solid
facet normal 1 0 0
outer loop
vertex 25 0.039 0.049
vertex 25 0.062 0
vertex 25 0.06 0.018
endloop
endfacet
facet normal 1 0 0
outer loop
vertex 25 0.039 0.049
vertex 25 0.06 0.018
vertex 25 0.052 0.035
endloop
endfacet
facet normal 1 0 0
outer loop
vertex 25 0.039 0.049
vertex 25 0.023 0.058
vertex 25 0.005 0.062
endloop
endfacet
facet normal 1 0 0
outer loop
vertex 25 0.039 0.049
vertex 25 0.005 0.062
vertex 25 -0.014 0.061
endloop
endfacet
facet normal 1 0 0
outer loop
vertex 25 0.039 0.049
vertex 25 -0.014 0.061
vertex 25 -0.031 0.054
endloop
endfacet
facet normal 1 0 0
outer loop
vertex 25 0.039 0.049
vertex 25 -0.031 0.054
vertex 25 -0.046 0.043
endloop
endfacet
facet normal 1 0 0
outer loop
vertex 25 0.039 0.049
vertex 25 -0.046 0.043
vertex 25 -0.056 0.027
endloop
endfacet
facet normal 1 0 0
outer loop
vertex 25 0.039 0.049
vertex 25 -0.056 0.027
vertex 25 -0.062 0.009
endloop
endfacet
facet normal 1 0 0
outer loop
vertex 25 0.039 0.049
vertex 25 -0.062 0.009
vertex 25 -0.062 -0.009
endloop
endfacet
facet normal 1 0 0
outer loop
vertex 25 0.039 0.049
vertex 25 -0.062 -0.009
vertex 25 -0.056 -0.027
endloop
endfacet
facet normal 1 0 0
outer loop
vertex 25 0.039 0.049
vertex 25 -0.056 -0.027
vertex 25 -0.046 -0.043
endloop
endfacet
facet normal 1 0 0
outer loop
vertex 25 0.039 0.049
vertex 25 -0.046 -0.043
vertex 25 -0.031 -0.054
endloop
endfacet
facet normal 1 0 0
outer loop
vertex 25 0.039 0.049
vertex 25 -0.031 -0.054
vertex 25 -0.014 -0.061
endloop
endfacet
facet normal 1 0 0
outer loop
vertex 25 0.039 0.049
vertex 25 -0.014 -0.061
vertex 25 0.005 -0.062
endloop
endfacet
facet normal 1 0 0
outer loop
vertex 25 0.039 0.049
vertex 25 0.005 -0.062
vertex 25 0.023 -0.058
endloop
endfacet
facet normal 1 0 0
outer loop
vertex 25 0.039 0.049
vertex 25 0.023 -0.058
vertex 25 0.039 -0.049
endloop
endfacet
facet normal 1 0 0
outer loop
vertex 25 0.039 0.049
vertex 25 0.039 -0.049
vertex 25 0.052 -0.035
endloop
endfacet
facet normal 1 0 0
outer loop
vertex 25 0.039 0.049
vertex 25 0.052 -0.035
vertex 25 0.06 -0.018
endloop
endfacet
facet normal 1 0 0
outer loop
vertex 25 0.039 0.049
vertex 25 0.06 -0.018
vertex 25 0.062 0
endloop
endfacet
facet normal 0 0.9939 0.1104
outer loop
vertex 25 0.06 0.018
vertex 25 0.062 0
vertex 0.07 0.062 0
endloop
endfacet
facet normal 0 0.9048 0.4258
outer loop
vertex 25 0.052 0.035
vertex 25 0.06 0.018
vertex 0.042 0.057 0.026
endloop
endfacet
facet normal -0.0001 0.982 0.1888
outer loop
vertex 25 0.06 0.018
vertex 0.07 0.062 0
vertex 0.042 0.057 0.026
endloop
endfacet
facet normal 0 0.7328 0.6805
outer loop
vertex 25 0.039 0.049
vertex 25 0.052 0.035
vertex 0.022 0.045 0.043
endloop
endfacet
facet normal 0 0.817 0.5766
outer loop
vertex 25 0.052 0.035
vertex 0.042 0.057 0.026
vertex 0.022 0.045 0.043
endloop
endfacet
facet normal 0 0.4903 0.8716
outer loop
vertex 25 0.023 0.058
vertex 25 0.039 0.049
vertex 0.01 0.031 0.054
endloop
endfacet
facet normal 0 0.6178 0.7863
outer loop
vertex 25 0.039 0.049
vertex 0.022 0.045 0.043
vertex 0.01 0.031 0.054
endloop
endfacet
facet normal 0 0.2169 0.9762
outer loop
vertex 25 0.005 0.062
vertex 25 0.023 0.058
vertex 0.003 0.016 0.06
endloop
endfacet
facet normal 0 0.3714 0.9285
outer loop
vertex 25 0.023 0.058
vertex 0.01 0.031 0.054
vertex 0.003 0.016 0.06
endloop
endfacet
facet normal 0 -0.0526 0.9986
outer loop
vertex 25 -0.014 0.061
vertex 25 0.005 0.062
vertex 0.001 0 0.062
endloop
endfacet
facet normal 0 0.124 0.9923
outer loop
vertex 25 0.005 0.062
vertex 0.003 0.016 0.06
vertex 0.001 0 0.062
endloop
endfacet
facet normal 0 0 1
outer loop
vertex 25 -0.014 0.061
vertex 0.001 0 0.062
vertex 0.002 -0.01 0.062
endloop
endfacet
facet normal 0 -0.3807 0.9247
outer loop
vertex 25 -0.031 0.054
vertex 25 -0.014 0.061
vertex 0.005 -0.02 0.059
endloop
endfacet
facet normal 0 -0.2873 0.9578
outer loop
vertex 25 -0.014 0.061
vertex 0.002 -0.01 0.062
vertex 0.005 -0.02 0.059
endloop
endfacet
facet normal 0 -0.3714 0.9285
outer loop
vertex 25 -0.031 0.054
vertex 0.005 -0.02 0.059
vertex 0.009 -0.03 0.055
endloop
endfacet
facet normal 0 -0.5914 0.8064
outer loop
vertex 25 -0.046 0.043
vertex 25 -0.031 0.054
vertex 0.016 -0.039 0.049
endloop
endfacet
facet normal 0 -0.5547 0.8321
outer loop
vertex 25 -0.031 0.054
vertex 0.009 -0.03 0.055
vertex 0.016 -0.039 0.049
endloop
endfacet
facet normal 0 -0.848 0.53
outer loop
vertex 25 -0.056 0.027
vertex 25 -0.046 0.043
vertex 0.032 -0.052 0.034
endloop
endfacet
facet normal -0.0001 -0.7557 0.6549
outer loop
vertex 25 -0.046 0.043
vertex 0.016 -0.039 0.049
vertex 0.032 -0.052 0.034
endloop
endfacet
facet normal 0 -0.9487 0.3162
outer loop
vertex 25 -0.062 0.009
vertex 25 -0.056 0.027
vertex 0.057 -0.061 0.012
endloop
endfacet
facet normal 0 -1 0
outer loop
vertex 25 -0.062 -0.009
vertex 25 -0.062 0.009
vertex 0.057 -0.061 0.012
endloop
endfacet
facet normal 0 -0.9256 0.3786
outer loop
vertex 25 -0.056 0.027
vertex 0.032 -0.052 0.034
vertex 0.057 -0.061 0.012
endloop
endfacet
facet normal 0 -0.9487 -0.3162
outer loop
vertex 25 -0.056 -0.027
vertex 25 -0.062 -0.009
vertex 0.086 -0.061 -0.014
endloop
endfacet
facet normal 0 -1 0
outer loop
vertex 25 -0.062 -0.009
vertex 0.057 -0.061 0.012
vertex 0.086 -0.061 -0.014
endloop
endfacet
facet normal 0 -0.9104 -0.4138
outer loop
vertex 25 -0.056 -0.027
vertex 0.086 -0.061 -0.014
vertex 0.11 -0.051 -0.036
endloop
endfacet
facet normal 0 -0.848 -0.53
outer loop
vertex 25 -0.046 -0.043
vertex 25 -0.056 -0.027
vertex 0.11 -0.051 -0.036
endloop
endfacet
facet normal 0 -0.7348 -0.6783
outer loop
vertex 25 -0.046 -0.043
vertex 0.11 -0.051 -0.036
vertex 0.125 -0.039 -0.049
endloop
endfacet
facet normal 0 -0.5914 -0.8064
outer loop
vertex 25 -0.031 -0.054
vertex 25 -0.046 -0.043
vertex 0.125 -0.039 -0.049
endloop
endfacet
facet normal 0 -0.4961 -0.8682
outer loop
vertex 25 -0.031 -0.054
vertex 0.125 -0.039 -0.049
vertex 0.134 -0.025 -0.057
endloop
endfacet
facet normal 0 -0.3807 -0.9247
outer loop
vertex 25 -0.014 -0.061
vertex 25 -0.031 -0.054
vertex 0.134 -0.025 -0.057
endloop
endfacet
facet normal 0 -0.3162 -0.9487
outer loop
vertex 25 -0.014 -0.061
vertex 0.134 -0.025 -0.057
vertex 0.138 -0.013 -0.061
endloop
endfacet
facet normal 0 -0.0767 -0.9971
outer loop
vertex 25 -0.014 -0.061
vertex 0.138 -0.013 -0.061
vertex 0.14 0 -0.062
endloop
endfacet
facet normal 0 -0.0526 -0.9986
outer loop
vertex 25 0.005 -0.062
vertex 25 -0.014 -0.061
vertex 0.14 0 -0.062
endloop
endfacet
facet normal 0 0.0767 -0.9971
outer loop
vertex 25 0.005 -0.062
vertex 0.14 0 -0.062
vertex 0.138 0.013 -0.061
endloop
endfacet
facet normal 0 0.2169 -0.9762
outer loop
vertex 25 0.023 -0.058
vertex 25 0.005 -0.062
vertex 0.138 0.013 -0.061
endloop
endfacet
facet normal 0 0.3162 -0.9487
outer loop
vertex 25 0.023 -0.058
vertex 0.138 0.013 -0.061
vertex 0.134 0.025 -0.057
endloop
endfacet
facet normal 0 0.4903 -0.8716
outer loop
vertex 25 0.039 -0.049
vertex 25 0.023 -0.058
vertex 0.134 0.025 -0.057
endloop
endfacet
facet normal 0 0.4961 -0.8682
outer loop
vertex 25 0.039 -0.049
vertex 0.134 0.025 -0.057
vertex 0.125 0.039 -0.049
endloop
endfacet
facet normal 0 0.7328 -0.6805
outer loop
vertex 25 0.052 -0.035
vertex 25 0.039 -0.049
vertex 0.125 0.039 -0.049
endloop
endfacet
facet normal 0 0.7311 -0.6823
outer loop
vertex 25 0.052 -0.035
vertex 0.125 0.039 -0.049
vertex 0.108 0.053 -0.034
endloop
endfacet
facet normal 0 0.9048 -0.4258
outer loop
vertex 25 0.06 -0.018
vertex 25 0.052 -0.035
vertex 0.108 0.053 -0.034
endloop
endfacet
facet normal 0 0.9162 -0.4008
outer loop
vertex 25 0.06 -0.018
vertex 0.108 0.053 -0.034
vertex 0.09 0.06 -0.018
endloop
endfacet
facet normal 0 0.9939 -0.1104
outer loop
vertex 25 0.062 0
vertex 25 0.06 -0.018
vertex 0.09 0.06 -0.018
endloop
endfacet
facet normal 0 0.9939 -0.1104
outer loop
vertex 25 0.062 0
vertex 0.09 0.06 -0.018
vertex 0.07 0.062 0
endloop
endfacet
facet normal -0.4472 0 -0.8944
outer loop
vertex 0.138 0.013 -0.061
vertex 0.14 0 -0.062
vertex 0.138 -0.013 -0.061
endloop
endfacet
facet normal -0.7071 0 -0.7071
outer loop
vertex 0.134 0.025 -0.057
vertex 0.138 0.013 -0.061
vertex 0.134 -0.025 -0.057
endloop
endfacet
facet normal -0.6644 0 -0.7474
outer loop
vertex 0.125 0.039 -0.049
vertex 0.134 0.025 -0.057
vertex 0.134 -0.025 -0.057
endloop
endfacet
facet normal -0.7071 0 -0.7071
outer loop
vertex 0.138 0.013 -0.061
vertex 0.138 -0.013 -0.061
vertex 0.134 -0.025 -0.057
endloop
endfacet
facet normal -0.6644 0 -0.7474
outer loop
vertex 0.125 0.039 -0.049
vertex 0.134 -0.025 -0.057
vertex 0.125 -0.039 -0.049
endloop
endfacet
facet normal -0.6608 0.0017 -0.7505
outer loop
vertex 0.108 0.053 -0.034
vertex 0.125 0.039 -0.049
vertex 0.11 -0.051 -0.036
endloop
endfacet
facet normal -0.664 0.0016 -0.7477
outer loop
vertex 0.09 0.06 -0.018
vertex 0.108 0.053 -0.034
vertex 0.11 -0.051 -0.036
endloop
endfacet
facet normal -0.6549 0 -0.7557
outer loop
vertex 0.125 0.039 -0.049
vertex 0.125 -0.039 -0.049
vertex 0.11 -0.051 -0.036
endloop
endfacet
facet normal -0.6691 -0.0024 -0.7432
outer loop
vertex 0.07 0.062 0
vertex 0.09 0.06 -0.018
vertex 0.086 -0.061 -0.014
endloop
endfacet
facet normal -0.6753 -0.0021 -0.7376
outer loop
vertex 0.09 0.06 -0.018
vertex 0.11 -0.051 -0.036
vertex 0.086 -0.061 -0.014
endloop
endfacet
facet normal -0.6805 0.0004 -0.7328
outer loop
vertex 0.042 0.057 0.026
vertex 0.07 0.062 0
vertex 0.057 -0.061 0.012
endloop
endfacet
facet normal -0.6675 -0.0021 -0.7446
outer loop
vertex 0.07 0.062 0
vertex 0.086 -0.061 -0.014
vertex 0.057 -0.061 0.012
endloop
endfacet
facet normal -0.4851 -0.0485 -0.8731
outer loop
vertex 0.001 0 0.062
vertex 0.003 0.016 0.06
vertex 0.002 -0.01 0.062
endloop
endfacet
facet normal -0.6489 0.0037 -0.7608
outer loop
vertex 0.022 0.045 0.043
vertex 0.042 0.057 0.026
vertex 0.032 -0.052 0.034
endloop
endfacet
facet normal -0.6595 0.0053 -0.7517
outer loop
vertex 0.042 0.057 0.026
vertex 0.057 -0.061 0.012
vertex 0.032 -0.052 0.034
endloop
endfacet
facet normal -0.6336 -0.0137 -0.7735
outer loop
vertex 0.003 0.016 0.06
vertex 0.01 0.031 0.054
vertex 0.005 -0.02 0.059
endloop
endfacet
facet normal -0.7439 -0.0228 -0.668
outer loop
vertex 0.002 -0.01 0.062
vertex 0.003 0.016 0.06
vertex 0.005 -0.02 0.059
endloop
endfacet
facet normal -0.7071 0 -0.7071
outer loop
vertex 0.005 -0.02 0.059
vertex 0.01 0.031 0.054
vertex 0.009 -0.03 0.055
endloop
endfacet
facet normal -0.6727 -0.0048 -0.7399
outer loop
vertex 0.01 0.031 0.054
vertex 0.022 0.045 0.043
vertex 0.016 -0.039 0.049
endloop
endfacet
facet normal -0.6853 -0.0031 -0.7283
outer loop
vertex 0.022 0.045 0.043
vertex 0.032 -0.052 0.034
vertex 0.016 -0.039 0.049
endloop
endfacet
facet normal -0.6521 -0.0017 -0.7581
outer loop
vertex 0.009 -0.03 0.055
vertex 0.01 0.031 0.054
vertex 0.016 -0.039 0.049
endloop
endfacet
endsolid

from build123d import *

# Parameters (mm, degrees)
F0_R     = 0.0625
F1_DEPTH = 25
F3_DEPTH = 25
F4_DEPTH = 25


with BuildPart() as f1:
    # F0 (on Right) → F1 (new body)
    with BuildSketch(Plane.YZ):
        Circle(F0_R)
    extrude(amount=F1_DEPTH)

    # F2 (on Front) → F3 (cut)
    with BuildSketch(Plane.XZ):
        Polygon((0.153794, -0.075297), (0, 0.06318), (0, -0.075297), align=None)
    extrude(amount=-F3_DEPTH, mode=Mode.SUBTRACT)

    # F2 (on Front) → F4 (cut)
    with BuildSketch(Plane.XZ):
        Polygon((0.153794, -0.075297), (0, 0.06318), (0, -0.075297), align=None)
    extrude(amount=F4_DEPTH, mode=Mode.SUBTRACT)


solid = f1.part
